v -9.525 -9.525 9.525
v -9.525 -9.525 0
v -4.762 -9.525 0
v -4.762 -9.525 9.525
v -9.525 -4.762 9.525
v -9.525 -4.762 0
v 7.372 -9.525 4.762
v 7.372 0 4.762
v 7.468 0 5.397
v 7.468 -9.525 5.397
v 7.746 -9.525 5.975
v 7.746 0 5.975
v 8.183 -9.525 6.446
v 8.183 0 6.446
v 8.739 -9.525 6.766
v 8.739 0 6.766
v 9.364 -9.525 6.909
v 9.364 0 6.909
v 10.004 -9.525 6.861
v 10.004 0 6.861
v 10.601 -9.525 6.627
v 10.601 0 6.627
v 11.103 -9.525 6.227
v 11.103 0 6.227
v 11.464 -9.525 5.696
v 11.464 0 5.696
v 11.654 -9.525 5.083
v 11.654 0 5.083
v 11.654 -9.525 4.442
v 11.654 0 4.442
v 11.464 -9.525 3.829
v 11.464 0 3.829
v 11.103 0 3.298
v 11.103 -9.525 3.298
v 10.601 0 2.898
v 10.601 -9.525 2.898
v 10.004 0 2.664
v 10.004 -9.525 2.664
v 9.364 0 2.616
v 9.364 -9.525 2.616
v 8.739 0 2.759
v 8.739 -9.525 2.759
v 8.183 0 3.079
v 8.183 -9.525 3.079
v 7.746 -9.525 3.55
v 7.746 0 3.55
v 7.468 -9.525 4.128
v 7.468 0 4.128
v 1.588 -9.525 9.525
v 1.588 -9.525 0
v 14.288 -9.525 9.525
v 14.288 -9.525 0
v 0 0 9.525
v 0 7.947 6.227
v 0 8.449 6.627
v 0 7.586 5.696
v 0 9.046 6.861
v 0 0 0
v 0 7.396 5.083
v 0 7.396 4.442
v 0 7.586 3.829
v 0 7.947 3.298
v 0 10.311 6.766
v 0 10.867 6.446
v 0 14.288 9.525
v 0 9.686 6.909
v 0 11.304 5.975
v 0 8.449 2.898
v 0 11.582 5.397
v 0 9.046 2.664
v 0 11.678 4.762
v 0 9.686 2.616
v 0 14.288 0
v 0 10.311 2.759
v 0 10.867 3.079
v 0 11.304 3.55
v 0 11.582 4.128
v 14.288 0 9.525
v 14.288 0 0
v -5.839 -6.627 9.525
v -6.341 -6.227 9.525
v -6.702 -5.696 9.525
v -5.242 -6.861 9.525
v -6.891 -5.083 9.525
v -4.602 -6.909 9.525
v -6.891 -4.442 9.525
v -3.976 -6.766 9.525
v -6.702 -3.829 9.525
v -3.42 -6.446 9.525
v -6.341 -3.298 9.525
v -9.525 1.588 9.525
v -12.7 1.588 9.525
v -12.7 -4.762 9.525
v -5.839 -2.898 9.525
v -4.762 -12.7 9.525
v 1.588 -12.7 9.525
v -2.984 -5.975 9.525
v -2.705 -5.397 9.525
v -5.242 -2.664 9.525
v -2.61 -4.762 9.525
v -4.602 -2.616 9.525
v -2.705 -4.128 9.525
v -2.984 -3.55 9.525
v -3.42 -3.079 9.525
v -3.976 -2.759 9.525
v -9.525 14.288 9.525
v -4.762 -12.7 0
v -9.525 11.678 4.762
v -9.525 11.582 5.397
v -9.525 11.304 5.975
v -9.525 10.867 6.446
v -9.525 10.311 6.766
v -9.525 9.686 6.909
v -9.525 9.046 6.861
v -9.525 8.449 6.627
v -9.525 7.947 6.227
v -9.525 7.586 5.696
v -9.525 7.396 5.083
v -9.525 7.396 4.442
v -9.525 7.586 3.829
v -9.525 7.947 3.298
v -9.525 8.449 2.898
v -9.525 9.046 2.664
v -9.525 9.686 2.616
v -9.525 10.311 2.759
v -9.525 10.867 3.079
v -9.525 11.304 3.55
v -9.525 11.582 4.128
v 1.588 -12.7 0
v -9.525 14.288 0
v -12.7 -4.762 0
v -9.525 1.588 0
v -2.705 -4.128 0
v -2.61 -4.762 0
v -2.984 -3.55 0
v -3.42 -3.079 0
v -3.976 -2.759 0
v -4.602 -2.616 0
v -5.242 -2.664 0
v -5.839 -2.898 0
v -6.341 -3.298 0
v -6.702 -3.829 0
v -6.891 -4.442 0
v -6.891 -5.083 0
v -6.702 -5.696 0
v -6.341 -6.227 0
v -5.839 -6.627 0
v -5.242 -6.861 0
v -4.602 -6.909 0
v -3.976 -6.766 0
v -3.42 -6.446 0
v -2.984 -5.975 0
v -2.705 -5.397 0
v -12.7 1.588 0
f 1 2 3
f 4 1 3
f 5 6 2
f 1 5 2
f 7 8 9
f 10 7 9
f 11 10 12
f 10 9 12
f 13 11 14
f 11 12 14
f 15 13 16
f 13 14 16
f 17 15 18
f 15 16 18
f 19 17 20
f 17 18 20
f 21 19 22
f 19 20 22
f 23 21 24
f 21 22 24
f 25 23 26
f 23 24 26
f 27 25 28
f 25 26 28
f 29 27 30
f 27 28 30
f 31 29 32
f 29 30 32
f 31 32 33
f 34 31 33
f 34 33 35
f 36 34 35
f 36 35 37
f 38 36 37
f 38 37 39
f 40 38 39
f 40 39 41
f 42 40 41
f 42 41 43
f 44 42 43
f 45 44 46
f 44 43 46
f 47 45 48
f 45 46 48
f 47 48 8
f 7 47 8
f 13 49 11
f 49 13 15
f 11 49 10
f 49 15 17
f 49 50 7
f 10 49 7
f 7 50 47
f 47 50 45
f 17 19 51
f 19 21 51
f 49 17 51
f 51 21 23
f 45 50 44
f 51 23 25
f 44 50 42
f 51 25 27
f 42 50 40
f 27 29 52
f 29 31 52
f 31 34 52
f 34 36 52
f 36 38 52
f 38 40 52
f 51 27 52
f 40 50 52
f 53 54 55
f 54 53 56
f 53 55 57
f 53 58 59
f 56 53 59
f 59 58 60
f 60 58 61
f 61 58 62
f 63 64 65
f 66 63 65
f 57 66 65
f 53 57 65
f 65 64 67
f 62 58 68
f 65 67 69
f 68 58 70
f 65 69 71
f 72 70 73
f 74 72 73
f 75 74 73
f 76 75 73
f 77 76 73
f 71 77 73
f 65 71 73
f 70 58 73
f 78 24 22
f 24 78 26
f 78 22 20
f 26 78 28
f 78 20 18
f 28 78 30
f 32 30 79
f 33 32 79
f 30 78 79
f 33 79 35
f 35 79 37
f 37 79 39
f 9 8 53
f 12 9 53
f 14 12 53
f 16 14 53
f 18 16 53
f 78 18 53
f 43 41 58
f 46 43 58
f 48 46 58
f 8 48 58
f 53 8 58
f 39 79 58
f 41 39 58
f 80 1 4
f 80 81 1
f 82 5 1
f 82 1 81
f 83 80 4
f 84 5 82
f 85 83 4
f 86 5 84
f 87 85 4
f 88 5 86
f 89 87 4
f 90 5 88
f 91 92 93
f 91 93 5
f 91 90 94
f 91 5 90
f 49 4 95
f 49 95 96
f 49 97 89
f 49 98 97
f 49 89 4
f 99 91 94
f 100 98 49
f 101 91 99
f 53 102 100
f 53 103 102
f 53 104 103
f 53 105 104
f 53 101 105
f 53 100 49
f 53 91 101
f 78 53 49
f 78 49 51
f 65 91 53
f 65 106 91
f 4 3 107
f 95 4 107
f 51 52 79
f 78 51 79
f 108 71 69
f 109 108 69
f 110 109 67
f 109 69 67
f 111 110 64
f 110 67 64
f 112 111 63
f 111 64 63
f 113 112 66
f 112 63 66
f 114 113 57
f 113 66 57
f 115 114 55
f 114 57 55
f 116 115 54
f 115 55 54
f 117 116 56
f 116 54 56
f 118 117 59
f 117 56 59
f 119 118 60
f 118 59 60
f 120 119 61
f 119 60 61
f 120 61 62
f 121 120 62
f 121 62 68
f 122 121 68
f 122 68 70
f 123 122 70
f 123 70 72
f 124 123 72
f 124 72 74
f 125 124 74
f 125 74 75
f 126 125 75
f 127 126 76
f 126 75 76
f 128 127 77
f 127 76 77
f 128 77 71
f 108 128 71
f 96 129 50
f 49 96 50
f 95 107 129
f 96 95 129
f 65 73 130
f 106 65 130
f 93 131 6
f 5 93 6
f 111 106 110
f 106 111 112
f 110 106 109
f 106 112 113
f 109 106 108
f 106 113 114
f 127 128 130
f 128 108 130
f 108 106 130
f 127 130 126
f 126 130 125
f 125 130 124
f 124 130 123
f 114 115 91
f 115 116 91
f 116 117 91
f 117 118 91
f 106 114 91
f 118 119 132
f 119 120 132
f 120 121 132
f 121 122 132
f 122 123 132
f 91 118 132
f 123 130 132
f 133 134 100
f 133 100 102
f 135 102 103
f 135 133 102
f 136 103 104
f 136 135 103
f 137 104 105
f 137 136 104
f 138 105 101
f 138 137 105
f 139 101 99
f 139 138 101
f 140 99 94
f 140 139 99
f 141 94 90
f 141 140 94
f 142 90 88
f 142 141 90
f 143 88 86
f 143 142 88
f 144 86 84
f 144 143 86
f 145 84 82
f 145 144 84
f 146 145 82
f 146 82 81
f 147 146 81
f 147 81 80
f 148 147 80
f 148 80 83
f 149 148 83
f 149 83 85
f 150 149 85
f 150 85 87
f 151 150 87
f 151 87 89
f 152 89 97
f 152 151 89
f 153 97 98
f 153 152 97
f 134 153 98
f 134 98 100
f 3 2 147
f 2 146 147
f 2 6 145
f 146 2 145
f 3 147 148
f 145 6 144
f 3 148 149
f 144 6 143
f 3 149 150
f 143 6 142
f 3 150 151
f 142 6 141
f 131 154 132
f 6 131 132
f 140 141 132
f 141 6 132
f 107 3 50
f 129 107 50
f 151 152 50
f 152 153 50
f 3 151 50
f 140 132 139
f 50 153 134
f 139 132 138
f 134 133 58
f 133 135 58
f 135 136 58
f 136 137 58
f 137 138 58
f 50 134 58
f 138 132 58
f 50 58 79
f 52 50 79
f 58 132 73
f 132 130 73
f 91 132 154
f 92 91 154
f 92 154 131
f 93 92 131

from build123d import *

# Parameters (mm, degrees)
F0_R     = 2.15265
F1_DEPTH = 9.525
F2_R     = 2.15265
F3_DEPTH = 9.525
F4_R     = 2.15265
F5_DEPTH = 9.525


with BuildPart() as f1:
    # F0 (on Top) → F1 (new body)
    with BuildSketch(Plane.XY):
        Polygon((14.2875, 0), (0, 0), (0, 14.2875), (-9.525, 14.2875), (-9.525, 1.5875), (-12.7, 1.5875), (-12.7, -4.7625), (-9.525, -4.7625), (-9.525, -9.525), (-4.7625, -9.525), (-4.7625, -12.7), (1.5875, -12.7), (1.5875, -9.525), (14.2875, -9.525), align=None)
        with Locations((-4.7625, -4.7625)):
            Circle(F0_R, mode=Mode.SUBTRACT)
    extrude(amount=F1_DEPTH)

    # F2 (on face) → F3 (cut, through all)
    with BuildSketch(Plane(origin=(0, 0, 0), x_dir=(-1, 0, 0), z_dir=(0, 1, 0))):
        with Locations((-9.525, 4.7625)):
            Circle(F2_R)
    extrude(amount=-F3_DEPTH, mode=Mode.SUBTRACT)

    # F4 (on face) → F5 (cut, through all)
    with BuildSketch(Plane.YZ):
        with Locations((9.525, 4.7625)):
            Circle(F4_R)
    extrude(amount=-F5_DEPTH, mode=Mode.SUBTRACT)


solid = f1.part
